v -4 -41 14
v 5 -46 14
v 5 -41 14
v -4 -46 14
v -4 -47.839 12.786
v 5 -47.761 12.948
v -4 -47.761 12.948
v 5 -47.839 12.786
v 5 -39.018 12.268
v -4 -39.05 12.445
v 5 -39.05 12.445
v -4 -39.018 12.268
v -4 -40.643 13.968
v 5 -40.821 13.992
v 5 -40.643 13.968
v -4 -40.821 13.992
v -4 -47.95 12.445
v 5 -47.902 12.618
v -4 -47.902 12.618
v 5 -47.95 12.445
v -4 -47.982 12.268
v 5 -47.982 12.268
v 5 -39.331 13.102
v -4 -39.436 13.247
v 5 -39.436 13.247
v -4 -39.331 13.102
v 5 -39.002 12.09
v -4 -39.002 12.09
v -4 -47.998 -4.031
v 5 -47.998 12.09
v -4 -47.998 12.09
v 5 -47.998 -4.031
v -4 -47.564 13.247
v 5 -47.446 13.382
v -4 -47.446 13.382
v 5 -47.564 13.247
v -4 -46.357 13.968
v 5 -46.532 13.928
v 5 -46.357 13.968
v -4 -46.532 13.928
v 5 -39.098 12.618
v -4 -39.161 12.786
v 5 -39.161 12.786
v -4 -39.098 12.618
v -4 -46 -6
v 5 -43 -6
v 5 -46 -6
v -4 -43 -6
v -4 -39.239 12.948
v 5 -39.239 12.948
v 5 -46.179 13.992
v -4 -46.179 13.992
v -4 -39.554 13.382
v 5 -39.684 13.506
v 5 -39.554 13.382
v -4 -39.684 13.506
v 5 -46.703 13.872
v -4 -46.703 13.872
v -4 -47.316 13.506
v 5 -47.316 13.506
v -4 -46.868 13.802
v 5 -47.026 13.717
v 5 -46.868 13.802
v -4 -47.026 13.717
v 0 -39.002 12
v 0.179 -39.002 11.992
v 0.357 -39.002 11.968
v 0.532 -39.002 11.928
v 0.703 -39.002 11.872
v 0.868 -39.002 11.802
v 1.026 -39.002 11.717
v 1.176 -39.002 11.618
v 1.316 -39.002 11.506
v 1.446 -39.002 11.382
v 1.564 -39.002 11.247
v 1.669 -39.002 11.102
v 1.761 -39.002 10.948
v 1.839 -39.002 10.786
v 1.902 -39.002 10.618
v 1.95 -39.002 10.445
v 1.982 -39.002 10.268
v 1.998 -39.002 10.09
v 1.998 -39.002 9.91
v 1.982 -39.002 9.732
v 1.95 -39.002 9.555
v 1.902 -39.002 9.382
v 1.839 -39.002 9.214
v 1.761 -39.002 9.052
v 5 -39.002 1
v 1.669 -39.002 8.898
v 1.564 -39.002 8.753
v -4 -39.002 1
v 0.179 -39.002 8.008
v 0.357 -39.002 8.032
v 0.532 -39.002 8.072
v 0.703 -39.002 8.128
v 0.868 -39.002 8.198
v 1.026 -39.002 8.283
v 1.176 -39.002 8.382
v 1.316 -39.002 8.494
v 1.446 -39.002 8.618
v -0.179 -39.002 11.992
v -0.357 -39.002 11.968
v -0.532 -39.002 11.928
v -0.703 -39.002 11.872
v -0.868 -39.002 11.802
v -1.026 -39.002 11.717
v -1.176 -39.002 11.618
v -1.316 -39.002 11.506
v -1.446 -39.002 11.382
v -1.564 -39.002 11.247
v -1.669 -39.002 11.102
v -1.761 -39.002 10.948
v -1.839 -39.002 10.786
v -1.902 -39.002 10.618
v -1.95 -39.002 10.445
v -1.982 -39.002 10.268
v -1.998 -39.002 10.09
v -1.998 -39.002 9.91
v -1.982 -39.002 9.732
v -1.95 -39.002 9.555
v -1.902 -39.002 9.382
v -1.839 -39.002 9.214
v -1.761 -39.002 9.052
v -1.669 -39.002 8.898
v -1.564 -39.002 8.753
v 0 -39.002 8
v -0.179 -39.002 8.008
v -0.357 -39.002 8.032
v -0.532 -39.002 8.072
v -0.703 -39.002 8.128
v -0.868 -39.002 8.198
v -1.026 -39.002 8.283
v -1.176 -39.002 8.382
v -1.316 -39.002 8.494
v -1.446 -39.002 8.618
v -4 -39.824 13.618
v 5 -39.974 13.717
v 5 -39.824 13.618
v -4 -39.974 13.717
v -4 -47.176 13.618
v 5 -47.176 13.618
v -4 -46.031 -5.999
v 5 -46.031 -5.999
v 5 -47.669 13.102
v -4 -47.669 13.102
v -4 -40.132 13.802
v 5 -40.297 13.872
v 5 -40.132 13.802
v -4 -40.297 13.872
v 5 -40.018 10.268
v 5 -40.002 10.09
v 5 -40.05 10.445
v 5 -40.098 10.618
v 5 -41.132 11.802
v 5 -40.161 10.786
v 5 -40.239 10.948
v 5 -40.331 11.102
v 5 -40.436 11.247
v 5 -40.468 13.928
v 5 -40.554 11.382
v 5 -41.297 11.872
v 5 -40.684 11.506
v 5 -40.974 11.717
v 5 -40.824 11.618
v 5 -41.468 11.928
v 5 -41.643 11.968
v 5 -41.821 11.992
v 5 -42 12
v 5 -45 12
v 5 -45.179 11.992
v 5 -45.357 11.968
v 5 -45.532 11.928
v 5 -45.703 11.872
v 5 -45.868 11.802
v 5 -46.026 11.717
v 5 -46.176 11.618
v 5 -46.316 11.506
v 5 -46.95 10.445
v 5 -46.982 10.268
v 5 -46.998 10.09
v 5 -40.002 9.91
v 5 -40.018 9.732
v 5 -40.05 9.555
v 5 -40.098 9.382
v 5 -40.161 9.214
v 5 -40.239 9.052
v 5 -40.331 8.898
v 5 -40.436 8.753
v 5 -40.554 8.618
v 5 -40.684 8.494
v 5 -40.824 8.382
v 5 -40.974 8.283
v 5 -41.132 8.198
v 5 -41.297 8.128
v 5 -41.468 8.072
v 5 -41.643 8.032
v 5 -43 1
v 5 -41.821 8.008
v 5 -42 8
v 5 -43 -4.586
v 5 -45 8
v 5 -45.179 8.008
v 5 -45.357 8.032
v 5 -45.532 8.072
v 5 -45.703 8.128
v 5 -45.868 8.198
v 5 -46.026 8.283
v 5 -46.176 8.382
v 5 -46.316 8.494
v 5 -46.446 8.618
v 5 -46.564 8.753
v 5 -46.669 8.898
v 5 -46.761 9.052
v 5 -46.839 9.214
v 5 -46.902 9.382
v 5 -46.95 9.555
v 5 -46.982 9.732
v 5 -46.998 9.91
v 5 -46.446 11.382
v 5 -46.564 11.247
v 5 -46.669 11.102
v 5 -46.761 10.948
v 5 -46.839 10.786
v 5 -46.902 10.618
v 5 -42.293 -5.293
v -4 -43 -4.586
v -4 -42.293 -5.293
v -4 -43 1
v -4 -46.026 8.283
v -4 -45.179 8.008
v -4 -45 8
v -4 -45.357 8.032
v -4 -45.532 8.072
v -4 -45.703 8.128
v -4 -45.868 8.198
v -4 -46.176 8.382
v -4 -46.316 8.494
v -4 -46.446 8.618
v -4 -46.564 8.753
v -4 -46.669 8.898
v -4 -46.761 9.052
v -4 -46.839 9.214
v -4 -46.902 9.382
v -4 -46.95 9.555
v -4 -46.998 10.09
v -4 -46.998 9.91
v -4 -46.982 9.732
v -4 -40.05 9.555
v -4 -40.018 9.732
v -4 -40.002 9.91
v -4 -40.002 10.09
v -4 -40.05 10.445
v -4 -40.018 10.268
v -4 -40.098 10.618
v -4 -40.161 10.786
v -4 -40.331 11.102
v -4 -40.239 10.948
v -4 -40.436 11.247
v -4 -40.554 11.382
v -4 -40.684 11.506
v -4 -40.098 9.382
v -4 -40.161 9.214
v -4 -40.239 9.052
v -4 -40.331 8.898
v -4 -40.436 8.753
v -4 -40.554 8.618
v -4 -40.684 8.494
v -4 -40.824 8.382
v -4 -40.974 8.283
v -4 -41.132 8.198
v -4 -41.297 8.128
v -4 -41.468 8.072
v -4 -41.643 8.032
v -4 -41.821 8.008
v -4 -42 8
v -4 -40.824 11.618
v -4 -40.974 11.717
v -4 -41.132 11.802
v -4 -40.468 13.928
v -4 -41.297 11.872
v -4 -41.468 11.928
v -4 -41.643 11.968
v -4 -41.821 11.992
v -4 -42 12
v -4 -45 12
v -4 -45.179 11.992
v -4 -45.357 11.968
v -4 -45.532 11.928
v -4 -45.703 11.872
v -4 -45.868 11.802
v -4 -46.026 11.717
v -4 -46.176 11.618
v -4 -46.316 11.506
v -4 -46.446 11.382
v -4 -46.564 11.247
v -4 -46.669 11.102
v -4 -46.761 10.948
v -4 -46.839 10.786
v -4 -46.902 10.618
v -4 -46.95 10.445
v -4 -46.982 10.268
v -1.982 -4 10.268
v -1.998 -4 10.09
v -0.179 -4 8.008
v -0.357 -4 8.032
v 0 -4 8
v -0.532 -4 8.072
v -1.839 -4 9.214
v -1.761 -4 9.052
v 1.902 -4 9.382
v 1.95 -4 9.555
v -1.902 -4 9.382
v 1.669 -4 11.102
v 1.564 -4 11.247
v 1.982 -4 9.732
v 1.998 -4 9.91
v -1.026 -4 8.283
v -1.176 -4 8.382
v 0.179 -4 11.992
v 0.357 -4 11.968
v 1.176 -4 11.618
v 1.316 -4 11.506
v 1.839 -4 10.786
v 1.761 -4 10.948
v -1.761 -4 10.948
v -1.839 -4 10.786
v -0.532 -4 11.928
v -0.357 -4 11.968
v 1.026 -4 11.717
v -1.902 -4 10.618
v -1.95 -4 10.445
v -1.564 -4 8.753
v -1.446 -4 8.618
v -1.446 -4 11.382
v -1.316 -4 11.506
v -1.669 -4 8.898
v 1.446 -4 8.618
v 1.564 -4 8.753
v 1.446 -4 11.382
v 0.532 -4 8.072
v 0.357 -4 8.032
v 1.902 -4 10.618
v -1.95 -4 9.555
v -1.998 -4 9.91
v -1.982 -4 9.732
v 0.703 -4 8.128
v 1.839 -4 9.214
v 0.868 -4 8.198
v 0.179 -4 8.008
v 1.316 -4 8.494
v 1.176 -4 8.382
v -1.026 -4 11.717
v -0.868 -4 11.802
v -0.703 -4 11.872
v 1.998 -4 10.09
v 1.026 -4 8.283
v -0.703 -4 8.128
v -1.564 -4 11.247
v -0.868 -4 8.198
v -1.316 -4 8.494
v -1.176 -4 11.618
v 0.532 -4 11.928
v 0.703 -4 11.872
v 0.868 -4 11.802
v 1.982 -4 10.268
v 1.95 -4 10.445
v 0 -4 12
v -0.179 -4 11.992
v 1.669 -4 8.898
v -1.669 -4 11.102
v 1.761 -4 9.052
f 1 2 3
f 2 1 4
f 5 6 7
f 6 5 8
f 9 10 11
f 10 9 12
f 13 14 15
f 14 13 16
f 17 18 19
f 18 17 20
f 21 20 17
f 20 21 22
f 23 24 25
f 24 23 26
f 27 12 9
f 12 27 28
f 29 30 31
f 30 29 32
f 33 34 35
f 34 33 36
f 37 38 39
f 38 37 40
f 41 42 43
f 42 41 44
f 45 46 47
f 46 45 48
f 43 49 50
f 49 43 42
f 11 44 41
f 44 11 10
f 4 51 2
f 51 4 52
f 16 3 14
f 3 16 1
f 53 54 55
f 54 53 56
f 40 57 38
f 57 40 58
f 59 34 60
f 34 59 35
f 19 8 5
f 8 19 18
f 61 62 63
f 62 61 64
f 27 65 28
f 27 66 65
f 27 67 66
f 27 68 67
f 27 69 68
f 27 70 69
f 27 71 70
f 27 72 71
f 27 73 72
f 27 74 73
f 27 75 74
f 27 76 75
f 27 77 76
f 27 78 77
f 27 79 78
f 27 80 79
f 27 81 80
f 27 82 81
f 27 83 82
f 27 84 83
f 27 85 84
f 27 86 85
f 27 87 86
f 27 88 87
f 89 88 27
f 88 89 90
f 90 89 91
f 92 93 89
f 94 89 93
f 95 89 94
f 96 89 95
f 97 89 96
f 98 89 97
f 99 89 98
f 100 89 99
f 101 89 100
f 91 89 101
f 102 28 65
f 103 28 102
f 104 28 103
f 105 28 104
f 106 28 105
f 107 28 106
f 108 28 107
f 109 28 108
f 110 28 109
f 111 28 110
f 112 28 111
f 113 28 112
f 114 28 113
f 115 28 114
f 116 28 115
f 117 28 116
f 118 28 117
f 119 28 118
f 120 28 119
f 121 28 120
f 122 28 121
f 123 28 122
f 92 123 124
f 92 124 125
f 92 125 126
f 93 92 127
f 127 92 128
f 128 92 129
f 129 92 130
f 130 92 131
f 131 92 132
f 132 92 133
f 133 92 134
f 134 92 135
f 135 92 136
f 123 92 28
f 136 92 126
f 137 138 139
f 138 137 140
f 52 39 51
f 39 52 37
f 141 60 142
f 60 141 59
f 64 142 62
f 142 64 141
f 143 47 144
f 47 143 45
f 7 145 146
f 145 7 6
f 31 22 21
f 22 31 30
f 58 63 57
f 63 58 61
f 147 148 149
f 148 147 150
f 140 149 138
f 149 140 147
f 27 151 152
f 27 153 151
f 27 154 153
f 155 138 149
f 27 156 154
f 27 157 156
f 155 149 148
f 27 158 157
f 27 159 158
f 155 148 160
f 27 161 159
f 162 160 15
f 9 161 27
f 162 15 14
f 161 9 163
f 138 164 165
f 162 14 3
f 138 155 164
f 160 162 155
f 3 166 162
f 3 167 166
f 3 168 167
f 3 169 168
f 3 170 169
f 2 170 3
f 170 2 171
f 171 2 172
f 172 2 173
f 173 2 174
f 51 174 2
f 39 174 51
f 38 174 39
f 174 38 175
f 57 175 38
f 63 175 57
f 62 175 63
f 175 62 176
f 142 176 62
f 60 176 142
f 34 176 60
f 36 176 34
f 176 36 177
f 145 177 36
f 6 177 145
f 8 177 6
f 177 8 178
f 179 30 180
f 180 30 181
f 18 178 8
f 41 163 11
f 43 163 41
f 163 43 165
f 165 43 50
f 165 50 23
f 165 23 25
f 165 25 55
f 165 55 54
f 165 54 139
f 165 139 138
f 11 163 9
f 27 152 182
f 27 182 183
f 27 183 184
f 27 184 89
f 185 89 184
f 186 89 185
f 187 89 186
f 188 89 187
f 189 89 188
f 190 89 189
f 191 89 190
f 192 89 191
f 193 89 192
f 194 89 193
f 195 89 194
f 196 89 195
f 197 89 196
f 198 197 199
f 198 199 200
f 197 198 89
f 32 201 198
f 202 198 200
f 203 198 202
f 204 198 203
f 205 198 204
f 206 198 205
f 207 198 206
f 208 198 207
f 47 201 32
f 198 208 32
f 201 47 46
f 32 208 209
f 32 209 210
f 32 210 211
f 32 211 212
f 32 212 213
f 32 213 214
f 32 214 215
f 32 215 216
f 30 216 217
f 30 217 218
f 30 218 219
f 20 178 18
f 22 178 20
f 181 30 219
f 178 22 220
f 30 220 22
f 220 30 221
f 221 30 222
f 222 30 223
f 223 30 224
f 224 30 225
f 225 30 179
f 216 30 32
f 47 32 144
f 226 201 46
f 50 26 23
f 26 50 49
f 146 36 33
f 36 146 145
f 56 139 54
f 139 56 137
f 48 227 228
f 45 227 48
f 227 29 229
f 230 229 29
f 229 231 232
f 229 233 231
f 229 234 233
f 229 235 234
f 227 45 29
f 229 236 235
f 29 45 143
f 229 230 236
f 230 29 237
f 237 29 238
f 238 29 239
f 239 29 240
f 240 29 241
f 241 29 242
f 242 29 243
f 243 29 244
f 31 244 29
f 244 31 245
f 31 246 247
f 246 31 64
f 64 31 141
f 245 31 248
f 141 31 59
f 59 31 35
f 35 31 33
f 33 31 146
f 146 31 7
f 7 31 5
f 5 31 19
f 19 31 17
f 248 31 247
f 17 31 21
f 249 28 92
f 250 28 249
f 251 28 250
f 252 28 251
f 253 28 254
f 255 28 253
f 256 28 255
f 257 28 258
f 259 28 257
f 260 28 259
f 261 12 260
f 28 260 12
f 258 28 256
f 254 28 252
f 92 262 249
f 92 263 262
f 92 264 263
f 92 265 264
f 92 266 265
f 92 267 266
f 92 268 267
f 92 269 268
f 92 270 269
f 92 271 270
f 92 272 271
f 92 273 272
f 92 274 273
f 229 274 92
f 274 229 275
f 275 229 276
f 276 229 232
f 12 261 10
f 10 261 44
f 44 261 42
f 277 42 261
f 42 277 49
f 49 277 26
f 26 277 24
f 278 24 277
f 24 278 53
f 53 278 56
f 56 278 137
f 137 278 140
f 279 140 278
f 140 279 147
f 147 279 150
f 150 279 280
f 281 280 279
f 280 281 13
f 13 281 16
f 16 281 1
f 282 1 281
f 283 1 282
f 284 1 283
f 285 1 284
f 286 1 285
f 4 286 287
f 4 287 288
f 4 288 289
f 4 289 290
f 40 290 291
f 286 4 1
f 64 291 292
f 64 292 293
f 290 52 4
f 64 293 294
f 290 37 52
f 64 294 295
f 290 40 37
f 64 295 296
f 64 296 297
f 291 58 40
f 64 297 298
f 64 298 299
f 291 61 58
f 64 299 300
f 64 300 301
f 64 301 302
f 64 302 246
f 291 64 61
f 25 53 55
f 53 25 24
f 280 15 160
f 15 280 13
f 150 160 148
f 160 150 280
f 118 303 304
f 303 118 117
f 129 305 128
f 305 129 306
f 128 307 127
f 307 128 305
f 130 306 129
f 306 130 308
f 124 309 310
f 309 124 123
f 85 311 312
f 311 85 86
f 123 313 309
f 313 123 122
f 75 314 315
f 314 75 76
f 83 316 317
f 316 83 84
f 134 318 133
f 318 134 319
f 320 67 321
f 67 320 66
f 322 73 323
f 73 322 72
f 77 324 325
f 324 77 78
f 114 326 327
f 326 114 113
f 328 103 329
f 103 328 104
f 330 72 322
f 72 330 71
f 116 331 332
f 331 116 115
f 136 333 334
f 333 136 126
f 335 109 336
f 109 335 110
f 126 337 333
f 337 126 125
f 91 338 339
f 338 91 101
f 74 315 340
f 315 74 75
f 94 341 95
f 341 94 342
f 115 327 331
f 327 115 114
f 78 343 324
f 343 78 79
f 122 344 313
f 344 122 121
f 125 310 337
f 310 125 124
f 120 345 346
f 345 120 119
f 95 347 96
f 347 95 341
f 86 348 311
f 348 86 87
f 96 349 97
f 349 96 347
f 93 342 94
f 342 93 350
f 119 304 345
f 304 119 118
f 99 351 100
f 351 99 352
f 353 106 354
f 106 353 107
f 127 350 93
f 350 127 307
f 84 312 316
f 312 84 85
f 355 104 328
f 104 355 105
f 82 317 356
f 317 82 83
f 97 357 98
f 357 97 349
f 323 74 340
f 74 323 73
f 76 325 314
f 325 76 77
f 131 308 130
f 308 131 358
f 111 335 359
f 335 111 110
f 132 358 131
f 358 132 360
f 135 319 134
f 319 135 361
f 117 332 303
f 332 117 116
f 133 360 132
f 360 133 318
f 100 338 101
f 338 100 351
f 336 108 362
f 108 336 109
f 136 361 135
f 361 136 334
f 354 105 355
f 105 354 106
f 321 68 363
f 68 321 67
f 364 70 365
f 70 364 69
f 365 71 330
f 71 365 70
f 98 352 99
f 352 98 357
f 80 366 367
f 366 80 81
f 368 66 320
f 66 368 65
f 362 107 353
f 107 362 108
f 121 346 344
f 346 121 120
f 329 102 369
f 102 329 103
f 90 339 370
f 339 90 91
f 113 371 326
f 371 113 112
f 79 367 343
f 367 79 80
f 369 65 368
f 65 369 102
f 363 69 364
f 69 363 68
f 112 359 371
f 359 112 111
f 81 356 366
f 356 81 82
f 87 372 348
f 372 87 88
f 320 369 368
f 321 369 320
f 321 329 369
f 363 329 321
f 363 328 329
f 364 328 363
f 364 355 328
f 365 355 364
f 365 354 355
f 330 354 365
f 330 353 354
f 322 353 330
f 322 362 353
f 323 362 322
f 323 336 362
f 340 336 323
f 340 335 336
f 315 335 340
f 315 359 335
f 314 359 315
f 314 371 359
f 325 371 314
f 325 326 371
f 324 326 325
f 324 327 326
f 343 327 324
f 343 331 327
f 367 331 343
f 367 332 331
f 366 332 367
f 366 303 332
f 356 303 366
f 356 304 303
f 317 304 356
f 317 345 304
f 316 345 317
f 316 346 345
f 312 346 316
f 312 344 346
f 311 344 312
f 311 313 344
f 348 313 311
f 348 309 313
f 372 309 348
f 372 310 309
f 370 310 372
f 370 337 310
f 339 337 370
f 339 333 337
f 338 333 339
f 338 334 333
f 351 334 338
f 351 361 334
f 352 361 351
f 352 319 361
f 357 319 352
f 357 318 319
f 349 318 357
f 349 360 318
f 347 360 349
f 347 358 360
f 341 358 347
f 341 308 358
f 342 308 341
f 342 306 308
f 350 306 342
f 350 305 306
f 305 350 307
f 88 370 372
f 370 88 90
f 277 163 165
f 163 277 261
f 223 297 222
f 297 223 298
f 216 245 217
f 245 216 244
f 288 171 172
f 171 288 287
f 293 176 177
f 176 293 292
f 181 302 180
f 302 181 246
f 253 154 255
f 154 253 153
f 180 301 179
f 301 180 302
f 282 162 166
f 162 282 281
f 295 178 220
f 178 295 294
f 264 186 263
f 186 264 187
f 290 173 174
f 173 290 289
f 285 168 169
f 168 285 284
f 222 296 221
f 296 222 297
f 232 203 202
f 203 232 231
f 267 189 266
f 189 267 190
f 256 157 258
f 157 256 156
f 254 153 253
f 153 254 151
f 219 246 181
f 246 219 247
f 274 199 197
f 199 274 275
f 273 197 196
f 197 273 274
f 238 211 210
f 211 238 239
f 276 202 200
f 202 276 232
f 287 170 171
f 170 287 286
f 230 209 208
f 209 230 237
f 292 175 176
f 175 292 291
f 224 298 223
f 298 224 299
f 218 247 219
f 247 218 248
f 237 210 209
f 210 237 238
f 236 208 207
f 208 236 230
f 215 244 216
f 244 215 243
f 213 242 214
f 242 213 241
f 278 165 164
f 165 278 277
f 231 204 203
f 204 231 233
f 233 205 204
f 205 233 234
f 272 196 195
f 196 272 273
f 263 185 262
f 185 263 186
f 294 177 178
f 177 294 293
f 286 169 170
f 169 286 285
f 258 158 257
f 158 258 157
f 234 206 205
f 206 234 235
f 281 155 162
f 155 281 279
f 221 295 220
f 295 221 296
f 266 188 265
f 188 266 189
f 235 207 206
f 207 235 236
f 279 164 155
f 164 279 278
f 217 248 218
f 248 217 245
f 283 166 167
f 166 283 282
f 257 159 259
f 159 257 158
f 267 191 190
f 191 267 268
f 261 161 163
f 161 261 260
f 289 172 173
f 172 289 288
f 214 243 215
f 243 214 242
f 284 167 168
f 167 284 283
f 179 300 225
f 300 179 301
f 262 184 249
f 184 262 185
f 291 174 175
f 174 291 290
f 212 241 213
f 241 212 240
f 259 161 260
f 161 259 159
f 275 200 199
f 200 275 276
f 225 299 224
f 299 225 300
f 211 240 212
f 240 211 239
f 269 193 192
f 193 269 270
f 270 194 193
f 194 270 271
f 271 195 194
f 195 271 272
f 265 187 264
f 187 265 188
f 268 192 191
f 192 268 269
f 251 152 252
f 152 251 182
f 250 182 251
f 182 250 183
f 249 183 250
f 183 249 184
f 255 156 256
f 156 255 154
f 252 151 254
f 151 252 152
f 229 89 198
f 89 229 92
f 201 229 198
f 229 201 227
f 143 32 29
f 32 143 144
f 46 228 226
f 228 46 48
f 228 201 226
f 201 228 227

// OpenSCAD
$fn=70;   // For persion of polygons


union(){
difference(){
union(){      // striker fire pin
translate([-4,-46,12]){
rotate([90,90,90]){ 
minkowski(){
    cube([16,5,8]);
    cylinder(r=2,h=1);
}}}
rotate([0,90,90]){ // pin hole cylinder
translate([-10,0,-40]){
    cylinder(36,r=2,2);
}}
}
translate([-10,-55,-16]){ // cut the tip off the notch
    cube([20,20,10]);
}
hull(){
rotate([90,90,90]){ // rubberband hole
translate([-10,-45,-20]){
    cylinder(40,r=2,2);
}}
rotate([90,90,90]){ // rubberband hole
translate([-10,-42,-20]){
    cylinder(40,r=2,2);
}}}


translate([-10,-43,-9]){ // cut a notch
    cube([20,20,10]);
}
translate([-10,-68,-10]){ // cut the back off
    cube([20,20,30]);
}

translate([-8,-50,-19]){   // make the ramp
rotate([45,0,0]){
    cube([16,12,12]);
}}
}
translate([-4,-43,-6]){  // catch
rotate([45,0,0]){
    cube([9,1,1]);
}}
}
